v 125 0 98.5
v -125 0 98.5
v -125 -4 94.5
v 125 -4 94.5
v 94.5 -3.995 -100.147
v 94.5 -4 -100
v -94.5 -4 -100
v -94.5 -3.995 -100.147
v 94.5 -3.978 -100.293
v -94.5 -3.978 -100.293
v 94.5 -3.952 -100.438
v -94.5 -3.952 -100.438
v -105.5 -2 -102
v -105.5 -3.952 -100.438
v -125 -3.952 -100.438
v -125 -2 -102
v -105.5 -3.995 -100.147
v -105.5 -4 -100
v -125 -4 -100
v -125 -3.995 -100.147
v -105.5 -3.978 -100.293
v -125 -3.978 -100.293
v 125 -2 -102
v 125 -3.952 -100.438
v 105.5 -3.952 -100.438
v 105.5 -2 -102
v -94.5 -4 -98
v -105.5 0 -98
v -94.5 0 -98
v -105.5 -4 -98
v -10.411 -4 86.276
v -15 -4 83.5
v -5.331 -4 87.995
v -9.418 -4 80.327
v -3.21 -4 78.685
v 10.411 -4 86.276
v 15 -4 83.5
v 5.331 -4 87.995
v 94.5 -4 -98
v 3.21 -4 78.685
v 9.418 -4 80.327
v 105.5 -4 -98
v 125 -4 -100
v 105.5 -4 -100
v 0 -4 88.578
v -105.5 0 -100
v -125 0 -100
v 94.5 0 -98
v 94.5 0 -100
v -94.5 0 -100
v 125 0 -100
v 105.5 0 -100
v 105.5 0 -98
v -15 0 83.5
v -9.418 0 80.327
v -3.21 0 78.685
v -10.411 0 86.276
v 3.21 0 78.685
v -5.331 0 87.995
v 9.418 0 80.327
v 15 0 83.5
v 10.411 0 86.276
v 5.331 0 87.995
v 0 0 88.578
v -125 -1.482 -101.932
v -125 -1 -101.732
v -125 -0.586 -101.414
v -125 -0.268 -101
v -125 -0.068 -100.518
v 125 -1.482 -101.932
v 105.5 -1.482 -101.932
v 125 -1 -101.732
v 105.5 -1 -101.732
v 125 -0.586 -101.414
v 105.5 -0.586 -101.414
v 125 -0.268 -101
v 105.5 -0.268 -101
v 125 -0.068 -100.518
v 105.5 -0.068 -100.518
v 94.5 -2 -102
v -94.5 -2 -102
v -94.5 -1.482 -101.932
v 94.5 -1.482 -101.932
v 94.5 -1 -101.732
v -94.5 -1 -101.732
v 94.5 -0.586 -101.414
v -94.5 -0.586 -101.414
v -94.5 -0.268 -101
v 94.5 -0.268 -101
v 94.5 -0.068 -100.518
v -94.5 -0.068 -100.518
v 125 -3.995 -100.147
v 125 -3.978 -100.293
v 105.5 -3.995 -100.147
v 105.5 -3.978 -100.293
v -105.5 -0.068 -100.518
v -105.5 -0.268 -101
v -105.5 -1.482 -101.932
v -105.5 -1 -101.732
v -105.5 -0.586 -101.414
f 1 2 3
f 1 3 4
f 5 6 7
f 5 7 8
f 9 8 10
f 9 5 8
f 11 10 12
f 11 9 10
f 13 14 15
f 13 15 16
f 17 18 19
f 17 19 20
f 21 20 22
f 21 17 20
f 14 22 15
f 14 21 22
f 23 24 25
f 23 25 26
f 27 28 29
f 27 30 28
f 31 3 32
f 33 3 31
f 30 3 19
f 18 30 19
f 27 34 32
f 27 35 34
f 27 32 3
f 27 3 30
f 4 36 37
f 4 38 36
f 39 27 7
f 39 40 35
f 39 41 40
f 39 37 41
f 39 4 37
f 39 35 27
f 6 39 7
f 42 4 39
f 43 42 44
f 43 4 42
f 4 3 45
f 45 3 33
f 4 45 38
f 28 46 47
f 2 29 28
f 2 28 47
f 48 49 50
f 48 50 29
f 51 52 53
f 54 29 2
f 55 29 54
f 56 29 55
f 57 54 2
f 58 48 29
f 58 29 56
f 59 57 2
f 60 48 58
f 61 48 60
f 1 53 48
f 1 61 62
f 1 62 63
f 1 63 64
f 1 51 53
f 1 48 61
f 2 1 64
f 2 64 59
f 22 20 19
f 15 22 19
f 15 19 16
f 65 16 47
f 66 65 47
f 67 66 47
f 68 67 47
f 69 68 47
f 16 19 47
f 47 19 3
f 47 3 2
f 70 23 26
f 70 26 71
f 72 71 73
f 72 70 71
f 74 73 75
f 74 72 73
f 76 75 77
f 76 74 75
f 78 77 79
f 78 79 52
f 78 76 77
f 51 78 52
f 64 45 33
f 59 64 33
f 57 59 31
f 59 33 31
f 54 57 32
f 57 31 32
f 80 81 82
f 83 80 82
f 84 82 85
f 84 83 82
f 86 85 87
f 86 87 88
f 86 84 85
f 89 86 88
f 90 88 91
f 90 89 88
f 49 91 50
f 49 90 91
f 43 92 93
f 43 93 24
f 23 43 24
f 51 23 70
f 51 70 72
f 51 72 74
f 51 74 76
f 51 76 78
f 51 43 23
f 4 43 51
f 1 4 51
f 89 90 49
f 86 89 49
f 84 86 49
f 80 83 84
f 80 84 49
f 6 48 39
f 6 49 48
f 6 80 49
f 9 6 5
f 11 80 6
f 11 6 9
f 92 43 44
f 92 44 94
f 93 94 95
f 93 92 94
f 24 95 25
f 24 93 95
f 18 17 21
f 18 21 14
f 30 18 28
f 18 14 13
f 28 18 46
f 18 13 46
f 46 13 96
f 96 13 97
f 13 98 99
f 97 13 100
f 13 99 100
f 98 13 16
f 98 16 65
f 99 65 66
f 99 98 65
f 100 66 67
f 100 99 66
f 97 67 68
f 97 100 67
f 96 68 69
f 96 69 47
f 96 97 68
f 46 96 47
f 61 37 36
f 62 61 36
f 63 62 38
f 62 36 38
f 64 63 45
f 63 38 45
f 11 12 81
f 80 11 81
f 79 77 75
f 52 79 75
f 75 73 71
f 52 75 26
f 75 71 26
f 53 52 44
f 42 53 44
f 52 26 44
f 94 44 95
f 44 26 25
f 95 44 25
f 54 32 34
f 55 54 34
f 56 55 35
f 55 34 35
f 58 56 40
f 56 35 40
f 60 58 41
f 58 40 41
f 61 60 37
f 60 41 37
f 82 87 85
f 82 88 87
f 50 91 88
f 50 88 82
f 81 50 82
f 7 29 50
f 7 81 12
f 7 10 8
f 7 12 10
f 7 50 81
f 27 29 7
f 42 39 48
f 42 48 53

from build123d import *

# Parameters (mm, degrees)
F0_W     = 250
F0_H     = 197
F1_DEPTH = 4
F3_W     = 11
F3_H     = 4
F4_DEPTH = 0.5
F5_DEPTH = 250
F6_DEPTH = 25
F8_DEPTH = 25
F9_SIZE  = 3.99999


# Not quite as in the source:
# - a fillet or chamfer is up to 0.001 mm smaller than in the source, because OpenCascade refuses the exact size


with BuildPart() as f1:
    # F0 (on Front) → F1 (new body)
    with BuildSketch(Plane.XZ):
        Rectangle(F0_W, F0_H)
    extrude(amount=F1_DEPTH)

    # F3 (on face) → F4 (cut)
    with BuildSketch(Plane(origin=(0, 0, -98.5), x_dir=(1, 0, 0), z_dir=(0, 0, -1))):
        Polygon((-105.5, 0), (-94.5, 0), (-94.5, 4), (-105.5, 4), (-105.5, 2), align=None)
        with Locations((100, 2)):
            Rectangle(F3_W, F3_H)
    extrude(amount=-F4_DEPTH, mode=Mode.SUBTRACT)

    # F2 (on face) → F5 (join)
    with BuildSketch(Plane.YZ.offset(125)):
        with BuildLine():
            Line((-3.3228756555, -98.5), (-4, -98.5))
            Line((-4, -98.5), (-4, -100))
            ThreePointArc((-4, -100), (-3.8228756555, -99.1771243445), (-3.3228756555, -98.5))
        make_face()
        with BuildLine():
            ThreePointArc((-3.3228756555, -98.5), (-3.8228756555, -99.1771243445), (-4, -100))
            Line((-4, -100), (0, -100))
            ThreePointArc((0, -100), (-0.1771243445, -99.1771243445), (-0.6771243445, -98.5))
            Line((-0.6771243445, -98.5), (-3.3228756555, -98.5))
        make_face()
        with BuildLine():
            ThreePointArc((-0.6771243445, -98.5), (-0.1771243445, -99.1771243445), (0, -100))
            Line((0, -100), (0, -98.5))
            Line((0, -98.5), (-0.6771243445, -98.5))
        make_face()
        with BuildLine():
            Line((0, -100), (-4, -100))
            ThreePointArc((-4, -100), (-3.9878535848, -100.2200866318), (-3.9515618745, -100.4375))
            Line((-3.9515618745, -100.4375), (-2, -102))
            ThreePointArc((-2, -102), (-0.5857864376, -101.4142135624), (0, -100))
        make_face()
    extrude(amount=-F5_DEPTH)

    # F3 (on face) → F6 (cut)
    with BuildSketch(Plane(origin=(0, 0, -98.5), x_dir=(1, 0, 0), z_dir=(0, 0, -1))):
        Polygon((-105.5, 0), (-94.5, 0), (-94.5, 4), (-105.5, 4), (-105.5, 2), align=None)
        with Locations((100, 2)):
            Rectangle(F3_W, F3_H)
    extrude(amount=F6_DEPTH, mode=Mode.SUBTRACT)

    # F7 (on face) → F8 (cut)
    with BuildSketch(Plane.XZ.offset(4)):
        with BuildLine():
            ThreePointArc((-15, 83.5), (0, 78.4776194071), (15, 83.5))
            Line((15, 83.5), (5, 83.5))
            ThreePointArc((5, 83.5), (0, 78.5), (-5, 83.5))
            Line((-5, 83.5), (-15, 83.5))
        make_face()
        with BuildLine():
            Line((5, 83.5), (0, 83.5))
            Line((0, 83.5), (-5, 83.5))
            ThreePointArc((-5, 83.5), (0, 78.5), (5, 83.5))
        make_face()
        with BuildLine():
            Line((0, 83.5), (0, 88.5))
            ThreePointArc((0, 88.5), (-3.5355339059, 87.0355339059), (-5, 83.5))
            Line((-5, 83.5), (0, 83.5))
        make_face()
        with BuildLine():
            Line((0, 88.5), (0, 88.5776101571))
            ThreePointArc((0, 88.5776101571), (-7.918050974, 87.2737885484), (-15, 83.5))
            Line((-15, 83.5), (-5, 83.5))
            ThreePointArc((-5, 83.5), (-3.5355339059, 87.0355339059), (0, 88.5))
        make_face()
        with BuildLine():
            ThreePointArc((5, 83.5), (3.5355339059, 87.0355339059), (0, 88.5))
            Line((0, 88.5), (0, 83.5))
            Line((0, 83.5), (5, 83.5))
        make_face()
        with BuildLine():
            ThreePointArc((15, 83.5), (7.918050974, 87.2737885484), (0, 88.5776101571))
            Line((0, 88.5776101571), (0, 88.5))
            ThreePointArc((0, 88.5), (3.5355339059, 87.0355339059), (5, 83.5))
            Line((5, 83.5), (15, 83.5))
        make_face()
    extrude(amount=-F8_DEPTH, mode=Mode.SUBTRACT)

    # F9 (size 4 in the source; OpenCascade refuses exactly that, so slightly less here)
    f9_edges = [f1.edges().sort_by_distance(p)[0] for p in [
        (0, -4, 98.5),
    ]]
    chamfer(f9_edges, length=F9_SIZE)


solid = f1.part
